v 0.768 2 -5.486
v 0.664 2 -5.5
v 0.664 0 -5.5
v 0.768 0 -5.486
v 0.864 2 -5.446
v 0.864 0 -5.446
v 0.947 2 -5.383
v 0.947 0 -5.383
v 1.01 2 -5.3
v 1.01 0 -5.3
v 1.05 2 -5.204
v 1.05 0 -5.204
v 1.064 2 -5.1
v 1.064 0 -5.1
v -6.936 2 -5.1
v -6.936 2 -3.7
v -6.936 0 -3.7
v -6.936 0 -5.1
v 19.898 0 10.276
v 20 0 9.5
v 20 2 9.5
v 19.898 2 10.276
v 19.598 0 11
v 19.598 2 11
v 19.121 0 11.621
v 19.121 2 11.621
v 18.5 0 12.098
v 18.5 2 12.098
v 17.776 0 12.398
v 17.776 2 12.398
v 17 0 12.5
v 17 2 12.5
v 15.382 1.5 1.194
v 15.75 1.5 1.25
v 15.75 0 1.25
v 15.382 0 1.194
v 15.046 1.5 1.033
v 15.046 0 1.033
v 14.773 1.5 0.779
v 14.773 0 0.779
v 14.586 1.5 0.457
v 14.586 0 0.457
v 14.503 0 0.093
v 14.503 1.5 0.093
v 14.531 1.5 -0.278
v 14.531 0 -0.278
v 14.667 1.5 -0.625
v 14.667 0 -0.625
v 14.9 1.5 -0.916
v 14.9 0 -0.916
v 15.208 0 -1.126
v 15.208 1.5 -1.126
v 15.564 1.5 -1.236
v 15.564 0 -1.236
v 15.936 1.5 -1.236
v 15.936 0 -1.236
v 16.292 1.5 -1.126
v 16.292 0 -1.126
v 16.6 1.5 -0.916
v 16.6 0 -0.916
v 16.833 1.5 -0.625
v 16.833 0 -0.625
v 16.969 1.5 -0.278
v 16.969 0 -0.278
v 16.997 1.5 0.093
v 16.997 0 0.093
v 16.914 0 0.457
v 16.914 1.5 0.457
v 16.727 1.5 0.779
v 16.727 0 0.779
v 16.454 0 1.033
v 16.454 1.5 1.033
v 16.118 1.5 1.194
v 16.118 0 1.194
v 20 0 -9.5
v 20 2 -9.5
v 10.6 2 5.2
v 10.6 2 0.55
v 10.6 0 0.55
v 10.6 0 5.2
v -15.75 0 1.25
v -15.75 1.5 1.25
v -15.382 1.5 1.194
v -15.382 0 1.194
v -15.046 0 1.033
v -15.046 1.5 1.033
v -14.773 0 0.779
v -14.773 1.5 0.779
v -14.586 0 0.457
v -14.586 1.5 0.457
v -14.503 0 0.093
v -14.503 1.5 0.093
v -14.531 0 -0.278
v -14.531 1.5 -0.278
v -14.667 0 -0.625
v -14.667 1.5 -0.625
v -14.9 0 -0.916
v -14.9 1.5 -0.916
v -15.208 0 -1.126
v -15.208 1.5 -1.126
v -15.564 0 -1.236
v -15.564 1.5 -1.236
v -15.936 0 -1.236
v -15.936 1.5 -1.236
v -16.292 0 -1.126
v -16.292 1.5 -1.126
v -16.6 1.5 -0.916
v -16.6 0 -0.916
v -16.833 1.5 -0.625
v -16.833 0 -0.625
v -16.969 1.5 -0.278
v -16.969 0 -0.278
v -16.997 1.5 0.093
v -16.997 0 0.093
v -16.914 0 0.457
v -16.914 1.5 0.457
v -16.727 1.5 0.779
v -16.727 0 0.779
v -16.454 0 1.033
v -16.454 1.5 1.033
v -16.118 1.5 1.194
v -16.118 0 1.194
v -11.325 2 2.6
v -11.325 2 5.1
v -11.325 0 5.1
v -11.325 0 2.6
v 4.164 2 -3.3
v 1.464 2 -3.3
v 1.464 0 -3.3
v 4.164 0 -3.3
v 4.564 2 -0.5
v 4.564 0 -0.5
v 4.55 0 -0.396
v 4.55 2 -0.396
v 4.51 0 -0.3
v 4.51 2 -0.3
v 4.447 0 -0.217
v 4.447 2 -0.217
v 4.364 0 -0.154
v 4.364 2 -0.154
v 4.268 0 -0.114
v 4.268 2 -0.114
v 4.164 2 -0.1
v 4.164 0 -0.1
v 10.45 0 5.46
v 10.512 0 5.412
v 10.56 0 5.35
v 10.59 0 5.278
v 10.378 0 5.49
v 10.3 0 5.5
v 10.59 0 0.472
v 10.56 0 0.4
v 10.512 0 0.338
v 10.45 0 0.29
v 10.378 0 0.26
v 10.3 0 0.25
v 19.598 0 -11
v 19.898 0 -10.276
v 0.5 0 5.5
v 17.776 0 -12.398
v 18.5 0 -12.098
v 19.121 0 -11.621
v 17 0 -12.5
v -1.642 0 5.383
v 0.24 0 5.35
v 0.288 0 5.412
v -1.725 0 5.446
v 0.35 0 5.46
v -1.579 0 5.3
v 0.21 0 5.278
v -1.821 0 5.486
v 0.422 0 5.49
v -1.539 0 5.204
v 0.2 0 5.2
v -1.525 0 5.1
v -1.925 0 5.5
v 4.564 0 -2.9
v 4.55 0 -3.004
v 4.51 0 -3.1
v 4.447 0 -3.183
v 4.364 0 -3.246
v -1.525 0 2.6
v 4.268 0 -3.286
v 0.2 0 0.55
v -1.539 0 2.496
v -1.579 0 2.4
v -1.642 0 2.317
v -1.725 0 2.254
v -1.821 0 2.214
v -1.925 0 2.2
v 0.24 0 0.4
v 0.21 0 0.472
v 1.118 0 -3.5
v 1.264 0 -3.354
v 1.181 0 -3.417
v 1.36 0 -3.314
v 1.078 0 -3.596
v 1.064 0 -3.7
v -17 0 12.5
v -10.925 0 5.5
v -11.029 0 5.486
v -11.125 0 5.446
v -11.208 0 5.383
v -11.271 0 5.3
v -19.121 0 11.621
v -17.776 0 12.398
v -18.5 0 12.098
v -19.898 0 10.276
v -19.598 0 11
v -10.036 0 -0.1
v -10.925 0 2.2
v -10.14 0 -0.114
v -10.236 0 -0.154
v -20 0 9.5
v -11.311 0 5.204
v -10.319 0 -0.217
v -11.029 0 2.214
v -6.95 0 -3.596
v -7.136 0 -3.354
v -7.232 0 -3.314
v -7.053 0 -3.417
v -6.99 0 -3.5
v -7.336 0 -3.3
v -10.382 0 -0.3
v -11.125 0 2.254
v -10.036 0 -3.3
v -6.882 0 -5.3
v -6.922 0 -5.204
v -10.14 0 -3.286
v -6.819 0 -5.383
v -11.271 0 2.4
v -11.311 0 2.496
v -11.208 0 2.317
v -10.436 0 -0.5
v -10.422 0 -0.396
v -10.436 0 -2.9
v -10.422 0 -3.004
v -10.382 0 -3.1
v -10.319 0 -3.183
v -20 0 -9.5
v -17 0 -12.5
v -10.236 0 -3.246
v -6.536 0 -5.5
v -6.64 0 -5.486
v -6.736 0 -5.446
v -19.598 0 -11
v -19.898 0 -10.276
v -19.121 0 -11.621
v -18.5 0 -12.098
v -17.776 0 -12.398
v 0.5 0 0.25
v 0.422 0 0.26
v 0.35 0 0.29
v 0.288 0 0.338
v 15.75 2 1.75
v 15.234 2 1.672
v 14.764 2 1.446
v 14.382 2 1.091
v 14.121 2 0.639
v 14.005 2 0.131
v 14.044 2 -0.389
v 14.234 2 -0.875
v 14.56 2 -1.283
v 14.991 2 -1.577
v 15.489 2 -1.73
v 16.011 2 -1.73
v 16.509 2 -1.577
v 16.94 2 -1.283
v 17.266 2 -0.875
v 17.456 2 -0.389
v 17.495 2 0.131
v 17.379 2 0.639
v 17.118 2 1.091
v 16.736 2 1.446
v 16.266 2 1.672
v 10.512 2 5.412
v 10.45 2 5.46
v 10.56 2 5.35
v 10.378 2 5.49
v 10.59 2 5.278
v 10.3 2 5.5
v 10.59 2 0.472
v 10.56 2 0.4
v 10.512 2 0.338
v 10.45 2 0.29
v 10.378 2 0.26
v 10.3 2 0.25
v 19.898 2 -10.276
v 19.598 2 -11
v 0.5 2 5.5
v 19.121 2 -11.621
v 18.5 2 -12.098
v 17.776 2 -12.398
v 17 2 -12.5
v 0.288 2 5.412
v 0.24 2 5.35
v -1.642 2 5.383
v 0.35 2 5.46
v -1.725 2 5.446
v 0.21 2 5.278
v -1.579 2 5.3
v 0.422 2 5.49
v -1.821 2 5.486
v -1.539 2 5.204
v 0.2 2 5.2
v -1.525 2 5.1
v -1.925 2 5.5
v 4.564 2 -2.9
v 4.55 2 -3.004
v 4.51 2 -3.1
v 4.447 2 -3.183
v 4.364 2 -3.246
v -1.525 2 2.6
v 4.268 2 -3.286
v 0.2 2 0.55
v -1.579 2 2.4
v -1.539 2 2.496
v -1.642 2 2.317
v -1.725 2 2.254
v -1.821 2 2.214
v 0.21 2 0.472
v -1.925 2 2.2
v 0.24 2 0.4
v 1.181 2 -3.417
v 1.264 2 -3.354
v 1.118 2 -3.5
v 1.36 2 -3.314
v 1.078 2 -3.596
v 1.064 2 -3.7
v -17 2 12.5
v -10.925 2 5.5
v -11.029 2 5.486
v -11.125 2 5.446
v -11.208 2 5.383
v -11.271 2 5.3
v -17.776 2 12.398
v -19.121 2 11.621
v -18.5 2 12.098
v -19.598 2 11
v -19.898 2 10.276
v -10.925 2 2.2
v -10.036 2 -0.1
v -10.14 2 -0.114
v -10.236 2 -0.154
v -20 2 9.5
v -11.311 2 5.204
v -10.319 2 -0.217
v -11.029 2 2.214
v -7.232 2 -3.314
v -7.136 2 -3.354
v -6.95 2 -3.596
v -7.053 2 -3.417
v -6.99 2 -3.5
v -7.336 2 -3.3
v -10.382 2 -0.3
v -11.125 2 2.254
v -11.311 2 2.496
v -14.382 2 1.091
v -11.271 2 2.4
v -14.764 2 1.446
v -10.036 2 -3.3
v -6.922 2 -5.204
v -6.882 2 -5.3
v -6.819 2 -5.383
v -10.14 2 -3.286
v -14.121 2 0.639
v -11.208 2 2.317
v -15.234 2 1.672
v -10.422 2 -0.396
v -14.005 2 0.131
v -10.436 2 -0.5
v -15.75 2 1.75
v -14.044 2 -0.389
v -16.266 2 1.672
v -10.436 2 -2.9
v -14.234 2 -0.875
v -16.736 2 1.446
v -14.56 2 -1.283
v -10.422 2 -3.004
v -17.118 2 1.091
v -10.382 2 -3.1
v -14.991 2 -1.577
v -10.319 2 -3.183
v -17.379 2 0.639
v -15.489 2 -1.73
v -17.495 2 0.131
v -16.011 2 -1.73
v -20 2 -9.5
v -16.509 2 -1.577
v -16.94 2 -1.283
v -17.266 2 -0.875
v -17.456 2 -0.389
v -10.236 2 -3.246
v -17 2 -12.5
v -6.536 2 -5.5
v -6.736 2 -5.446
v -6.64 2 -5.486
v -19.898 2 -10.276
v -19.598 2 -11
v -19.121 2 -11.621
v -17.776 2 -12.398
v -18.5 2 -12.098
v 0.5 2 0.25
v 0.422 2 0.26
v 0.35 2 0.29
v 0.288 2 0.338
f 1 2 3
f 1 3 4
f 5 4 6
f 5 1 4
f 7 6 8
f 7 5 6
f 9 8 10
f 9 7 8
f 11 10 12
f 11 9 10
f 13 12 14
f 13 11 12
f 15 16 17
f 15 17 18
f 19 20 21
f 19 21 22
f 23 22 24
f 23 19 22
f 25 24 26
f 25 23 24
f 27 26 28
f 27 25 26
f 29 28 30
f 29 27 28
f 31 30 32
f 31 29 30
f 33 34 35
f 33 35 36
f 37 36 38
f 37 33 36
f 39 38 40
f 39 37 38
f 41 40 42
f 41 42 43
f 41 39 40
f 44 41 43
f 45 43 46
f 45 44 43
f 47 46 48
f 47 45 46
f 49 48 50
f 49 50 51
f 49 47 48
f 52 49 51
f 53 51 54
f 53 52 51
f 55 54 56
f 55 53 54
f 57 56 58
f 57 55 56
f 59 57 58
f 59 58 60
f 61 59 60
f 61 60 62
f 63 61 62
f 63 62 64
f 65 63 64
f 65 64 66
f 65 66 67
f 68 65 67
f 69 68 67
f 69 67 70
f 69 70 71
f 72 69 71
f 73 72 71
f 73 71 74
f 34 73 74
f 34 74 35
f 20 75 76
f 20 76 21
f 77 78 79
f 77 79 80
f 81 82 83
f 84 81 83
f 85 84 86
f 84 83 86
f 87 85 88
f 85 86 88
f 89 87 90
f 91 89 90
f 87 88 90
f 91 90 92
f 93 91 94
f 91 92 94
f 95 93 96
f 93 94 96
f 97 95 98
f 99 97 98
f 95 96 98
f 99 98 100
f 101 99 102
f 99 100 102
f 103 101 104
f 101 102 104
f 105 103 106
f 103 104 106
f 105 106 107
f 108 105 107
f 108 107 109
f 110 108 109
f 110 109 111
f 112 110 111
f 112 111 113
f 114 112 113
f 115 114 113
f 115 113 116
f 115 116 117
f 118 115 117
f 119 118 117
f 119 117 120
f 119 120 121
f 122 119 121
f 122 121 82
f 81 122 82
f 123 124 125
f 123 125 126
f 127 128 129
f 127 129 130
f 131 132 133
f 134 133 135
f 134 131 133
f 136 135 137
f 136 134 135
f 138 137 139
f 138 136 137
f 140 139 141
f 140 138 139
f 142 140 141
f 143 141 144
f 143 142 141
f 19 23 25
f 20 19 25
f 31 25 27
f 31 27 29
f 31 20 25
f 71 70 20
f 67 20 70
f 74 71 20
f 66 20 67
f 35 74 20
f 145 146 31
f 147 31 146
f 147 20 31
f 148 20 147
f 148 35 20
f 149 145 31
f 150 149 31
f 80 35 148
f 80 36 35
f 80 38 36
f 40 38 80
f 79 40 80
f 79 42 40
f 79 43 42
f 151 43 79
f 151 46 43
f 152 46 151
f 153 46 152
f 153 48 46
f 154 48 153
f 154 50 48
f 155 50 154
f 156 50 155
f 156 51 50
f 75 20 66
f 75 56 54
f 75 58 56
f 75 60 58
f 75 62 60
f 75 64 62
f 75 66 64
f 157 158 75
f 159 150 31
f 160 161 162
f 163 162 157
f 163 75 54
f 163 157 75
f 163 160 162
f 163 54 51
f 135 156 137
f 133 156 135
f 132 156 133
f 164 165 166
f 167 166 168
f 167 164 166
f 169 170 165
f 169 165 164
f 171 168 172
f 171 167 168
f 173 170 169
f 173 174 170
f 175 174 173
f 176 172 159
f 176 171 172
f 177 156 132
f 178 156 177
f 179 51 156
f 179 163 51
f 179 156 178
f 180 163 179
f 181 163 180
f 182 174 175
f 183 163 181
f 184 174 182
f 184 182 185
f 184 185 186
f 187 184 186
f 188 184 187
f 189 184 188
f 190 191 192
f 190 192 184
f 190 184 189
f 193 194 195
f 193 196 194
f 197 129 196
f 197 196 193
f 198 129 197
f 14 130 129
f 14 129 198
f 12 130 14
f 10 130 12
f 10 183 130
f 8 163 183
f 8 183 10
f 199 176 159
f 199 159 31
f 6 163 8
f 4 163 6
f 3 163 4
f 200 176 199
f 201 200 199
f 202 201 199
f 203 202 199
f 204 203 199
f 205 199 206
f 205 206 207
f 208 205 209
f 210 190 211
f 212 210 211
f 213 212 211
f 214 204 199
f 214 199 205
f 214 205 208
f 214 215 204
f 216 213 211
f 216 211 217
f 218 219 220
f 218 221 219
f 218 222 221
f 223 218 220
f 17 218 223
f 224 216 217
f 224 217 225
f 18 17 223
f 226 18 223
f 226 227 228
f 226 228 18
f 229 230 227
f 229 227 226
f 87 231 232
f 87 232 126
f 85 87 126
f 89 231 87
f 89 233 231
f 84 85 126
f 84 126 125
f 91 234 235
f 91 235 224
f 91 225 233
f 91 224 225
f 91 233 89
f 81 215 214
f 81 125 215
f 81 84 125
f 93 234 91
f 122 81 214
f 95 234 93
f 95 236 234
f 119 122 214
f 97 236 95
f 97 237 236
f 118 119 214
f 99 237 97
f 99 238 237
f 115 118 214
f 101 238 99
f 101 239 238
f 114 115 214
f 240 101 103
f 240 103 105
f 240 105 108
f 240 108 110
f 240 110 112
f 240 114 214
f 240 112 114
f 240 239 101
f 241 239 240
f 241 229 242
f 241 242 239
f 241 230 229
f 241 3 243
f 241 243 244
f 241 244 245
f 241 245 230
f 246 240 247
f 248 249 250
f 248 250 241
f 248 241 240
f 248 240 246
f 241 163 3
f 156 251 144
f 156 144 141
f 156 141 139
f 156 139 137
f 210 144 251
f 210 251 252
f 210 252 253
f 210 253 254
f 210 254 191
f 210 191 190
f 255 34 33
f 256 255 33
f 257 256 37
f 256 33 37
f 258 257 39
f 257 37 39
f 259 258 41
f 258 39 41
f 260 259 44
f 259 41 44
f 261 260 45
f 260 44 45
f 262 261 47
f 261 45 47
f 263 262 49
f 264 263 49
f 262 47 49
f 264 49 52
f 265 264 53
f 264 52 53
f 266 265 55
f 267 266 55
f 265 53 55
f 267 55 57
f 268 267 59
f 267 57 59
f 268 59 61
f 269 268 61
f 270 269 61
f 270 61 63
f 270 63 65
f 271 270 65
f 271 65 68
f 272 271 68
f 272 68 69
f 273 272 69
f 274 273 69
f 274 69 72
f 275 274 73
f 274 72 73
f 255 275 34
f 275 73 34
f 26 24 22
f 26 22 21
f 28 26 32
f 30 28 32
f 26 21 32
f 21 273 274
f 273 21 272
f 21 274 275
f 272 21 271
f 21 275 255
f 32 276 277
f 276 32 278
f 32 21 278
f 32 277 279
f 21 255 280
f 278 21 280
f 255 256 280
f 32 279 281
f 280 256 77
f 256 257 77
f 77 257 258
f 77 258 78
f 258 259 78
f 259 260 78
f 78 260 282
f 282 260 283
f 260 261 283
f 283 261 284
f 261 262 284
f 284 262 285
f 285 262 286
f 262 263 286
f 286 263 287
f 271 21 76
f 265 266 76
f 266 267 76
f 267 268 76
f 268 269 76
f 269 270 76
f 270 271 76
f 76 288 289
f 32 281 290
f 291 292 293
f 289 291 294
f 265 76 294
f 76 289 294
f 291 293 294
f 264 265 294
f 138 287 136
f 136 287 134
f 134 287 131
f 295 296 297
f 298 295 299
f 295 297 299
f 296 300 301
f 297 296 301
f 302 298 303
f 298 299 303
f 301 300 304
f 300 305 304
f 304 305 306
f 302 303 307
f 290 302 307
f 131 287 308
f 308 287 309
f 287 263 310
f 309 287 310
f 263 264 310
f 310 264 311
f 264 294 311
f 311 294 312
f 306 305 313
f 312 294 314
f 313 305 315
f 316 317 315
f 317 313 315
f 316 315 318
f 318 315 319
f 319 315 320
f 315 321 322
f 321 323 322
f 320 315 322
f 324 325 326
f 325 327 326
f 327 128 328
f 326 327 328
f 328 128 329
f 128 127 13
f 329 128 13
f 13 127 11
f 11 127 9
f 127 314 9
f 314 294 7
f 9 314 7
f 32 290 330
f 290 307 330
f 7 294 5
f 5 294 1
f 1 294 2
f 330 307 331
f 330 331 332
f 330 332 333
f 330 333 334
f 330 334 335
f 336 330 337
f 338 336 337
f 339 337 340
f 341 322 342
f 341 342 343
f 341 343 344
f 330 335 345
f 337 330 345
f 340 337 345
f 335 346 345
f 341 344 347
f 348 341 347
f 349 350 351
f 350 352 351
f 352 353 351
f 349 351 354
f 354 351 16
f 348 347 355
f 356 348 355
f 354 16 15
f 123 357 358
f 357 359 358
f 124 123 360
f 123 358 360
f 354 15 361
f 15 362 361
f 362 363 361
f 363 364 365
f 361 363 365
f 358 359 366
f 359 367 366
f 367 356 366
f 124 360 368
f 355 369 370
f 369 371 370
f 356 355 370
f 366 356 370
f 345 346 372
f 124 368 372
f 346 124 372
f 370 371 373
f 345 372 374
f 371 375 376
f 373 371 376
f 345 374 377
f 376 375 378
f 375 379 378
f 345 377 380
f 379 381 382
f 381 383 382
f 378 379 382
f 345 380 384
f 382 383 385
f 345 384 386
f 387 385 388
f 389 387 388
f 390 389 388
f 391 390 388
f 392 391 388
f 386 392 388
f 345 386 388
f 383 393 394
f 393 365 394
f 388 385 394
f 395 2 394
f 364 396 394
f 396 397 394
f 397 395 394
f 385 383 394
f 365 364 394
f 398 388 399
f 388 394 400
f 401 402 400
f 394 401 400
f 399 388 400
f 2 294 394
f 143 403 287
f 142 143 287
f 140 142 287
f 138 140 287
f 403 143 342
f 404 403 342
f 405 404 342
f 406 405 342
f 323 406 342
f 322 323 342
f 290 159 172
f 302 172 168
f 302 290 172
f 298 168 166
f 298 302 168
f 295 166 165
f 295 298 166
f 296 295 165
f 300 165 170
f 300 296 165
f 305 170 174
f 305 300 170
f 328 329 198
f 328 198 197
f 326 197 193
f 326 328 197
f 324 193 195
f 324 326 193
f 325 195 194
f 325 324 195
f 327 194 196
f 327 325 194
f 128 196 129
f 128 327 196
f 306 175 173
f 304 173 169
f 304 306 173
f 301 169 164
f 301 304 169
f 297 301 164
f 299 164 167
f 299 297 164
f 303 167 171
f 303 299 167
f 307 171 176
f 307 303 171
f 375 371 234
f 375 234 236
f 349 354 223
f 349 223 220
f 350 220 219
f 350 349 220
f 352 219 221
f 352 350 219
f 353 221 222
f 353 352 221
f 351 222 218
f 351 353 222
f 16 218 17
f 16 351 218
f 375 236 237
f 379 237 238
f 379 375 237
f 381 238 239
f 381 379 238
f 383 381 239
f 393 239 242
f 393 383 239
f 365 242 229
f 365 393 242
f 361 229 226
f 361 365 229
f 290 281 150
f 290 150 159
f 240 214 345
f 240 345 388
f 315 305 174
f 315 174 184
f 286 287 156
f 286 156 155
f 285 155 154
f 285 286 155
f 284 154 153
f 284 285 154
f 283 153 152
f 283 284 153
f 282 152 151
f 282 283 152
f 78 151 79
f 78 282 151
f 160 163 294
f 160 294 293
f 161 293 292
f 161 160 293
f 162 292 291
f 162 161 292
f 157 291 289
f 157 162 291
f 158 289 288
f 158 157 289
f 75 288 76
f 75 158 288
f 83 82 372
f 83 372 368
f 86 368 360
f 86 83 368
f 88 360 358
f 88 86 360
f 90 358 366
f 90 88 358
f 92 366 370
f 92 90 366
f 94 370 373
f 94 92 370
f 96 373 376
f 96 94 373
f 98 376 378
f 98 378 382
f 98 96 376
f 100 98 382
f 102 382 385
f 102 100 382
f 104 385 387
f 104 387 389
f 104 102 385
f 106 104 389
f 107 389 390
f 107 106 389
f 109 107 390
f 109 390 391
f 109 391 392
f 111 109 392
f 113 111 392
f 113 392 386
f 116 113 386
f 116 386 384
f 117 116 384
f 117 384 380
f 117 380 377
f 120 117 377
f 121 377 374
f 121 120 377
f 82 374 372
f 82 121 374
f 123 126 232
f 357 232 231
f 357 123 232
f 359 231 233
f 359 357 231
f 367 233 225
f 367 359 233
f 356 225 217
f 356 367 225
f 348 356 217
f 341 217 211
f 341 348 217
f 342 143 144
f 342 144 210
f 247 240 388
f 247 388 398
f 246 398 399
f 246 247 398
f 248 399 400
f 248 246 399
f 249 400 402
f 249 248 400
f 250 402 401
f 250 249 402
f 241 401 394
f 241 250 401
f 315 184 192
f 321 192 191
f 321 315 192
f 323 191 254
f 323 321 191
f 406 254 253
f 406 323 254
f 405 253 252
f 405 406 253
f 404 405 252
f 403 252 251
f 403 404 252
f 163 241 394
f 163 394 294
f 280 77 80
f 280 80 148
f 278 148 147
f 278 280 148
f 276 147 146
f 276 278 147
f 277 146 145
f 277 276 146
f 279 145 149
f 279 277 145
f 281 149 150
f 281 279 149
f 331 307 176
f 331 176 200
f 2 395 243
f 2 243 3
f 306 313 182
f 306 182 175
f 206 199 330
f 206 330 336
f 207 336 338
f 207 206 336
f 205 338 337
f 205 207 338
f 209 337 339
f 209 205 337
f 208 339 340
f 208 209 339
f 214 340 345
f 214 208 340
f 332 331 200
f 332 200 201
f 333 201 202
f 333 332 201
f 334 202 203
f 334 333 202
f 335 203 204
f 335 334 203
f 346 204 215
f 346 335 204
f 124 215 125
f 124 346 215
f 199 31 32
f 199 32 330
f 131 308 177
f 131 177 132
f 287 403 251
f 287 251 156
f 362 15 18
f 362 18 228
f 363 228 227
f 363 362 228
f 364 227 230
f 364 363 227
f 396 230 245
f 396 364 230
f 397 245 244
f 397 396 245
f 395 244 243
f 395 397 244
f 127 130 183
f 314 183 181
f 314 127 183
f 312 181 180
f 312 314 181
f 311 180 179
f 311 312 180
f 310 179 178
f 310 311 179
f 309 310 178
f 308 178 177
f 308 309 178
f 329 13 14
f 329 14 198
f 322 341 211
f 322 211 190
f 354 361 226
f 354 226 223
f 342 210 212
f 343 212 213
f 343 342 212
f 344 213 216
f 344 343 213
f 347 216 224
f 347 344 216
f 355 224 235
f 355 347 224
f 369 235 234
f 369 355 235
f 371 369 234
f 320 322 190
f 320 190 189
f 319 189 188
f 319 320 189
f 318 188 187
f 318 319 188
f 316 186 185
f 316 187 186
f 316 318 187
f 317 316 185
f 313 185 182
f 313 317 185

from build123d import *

# Parameters (mm, degrees)
EXTRUDE_1_DEPTH            = 2
CUT_EXTRUDE_1_REACH        = 25.67
SKETCH_2_R                 = 1.25
CHAMFER_1_SIZE             = 0.5
CHAMFER_1_OF_MIRROR_3_SIZE = 0.5
CUT_EXTRUDE_5_REACH        = 25.67


with BuildPart() as part:
    # 草图1 → 凸台-拉伸1 (new body)
    with BuildSketch(Plane(origin=(0, 0, 0), x_dir=(1, 0, 0), z_dir=(0, 1, 0))):
        with BuildLine():
            Line((-17, 12.5), (17, 12.5))
            ThreePointArc((17, 12.5), (19.121320344, 11.621320344), (20, 9.5))
            Line((20, 9.5), (20, -9.5))
            ThreePointArc((20, -9.5), (19.121320344, -11.621320344), (17, -12.5))
            Line((17, -12.5), (-17, -12.5))
            ThreePointArc((-17, -12.5), (-19.121320344, -11.621320344), (-20, -9.5))
            Line((-20, -9.5), (-20, 9.5))
            ThreePointArc((-20, 9.5), (-19.121320344, 11.621320344), (-17, 12.5))
        make_face()
    extrude(amount=EXTRUDE_1_DEPTH)

    # 草图2 → 切除-拉伸1 (cut, up to next)
    with BuildSketch(Plane(origin=(0, 2, 0), x_dir=(1, 0, 0), z_dir=(0, 1, 0)), mode=Mode.PRIVATE) as cut_extrude_1_sk1:
        with Locations(Location((-15.75, 0, 0), (0, 0, 270))):
            Circle(SKETCH_2_R)
    cut_extrude_1_tool1 = extrude(cut_extrude_1_sk1.sketch, amount=-CUT_EXTRUDE_1_REACH, mode=Mode.PRIVATE) & part.part
    cut_extrude_1 = cut_extrude_1_tool1.solids().sort_by_distance((-15.75, 2, 0))[0]
    add(cut_extrude_1, mode=Mode.SUBTRACT)

    # 倒角1
    chamfer_1_edges = [part.edges().sort_by_distance(p)[0] for p in [
        (-15.75, 2, -1.25),
    ]]
    chamfer(chamfer_1_edges, length=CHAMFER_1_SIZE)

    # 镜向3: 切除-拉伸1 across plane
    add(cut_extrude_1.mirror(Plane(origin=(0, 0, 0), x_dir=(0, 0, 1), z_dir=(1, 0, 0))), mode=Mode.SUBTRACT)

    # 倒角1 of 镜向3
    chamfer_1_of_mirror_3_edges = [part.edges().sort_by_distance(p)[0] for p in [
        (15.75, 2, -1.25),
    ]]
    chamfer(chamfer_1_of_mirror_3_edges, length=CHAMFER_1_OF_MIRROR_3_SIZE)

    # 草图6 → 切除-拉伸5 (cut, up to next)
    with BuildSketch(Plane(origin=(0, 2, 0), x_dir=(1, 0, 0), z_dir=(0, 1, 0)), mode=Mode.PRIVATE) as cut_extrude_5_sk1:
        with BuildLine():
            Line((-10.036, 3.3), (-7.336, 3.3))
            ThreePointArc((-7.336, 3.3), (-7.053157288, 3.417157288), (-6.936, 3.7))
            Line((-6.936, 3.7), (-6.936, 5.1))
            ThreePointArc((-6.936, 5.1), (-6.818842712, 5.382842712), (-6.536, 5.5))
            Line((-6.536, 5.5), (0.664, 5.5))
            ThreePointArc((0.664, 5.5), (0.946842712, 5.382842712), (1.064, 5.1))
            Line((1.064, 5.1), (1.064, 3.7))
            ThreePointArc((1.064, 3.7), (1.181157288, 3.417157288), (1.464, 3.3))
            Line((1.464, 3.3), (4.164, 3.3))
            ThreePointArc((4.164, 3.3), (4.446842712, 3.182842712), (4.564, 2.9))
            Line((4.564, 2.9), (4.564, 0.5))
            ThreePointArc((4.564, 0.5), (4.446842712, 0.217157288), (4.164, 0.1))
            Line((4.164, 0.1), (-10.036, 0.1))
            ThreePointArc((-10.036, 0.1), (-10.318842712, 0.217157288), (-10.436, 0.5))
            Line((-10.436, 0.5), (-10.436, 2.9))
            ThreePointArc((-10.436, 2.9), (-10.318842712, 3.182842712), (-10.036, 3.3))
        make_face()
    cut_extrude_5_tool1 = extrude(cut_extrude_5_sk1.sketch, amount=-CUT_EXTRUDE_5_REACH, mode=Mode.PRIVATE) & part.part
    # 草图6 → 切除-拉伸5 (cut, up to next)
    with BuildSketch(Plane(origin=(0, 2, 0), x_dir=(1, 0, 0), z_dir=(0, 1, 0)), mode=Mode.PRIVATE) as cut_extrude_5_sk2:
        with BuildLine():
            Line((-10.925, -2.2), (-1.925, -2.2))
            ThreePointArc((-1.925, -2.2), (-1.642157288, -2.317157288), (-1.525, -2.6))
            Line((-1.525, -2.6), (-1.525, -5.1))
            ThreePointArc((-1.525, -5.1), (-1.642157288, -5.382842712), (-1.925, -5.5))
            Line((-1.925, -5.5), (-10.925, -5.5))
            ThreePointArc((-10.925, -5.5), (-11.207842712, -5.382842712), (-11.325, -5.1))
            Line((-11.325, -5.1), (-11.325, -2.6))
            ThreePointArc((-11.325, -2.6), (-11.207842712, -2.317157288), (-10.925, -2.2))
        make_face()
    cut_extrude_5_tool2 = extrude(cut_extrude_5_sk2.sketch, amount=-CUT_EXTRUDE_5_REACH, mode=Mode.PRIVATE) & part.part
    # 草图6 → 切除-拉伸5 (cut, up to next)
    with BuildSketch(Plane(origin=(0, 2, 0), x_dir=(1, 0, 0), z_dir=(0, 1, 0)), mode=Mode.PRIVATE) as cut_extrude_5_sk3:
        with BuildLine():
            Line((0.5, -0.25), (10.3, -0.25))
            ThreePointArc((10.3, -0.25), (10.512132034, -0.337867966), (10.6, -0.55))
            Line((10.6, -0.55), (10.6, -5.2))
            ThreePointArc((10.6, -5.2), (10.512132034, -5.412132034), (10.3, -5.5))
            Line((10.3, -5.5), (0.5, -5.5))
            ThreePointArc((0.5, -5.5), (0.287867966, -5.412132034), (0.2, -5.2))
            Line((0.2, -5.2), (0.2, -0.55))
            ThreePointArc((0.2, -0.55), (0.287867966, -0.337867966), (0.5, -0.25))
        make_face()
    cut_extrude_5_tool3 = extrude(cut_extrude_5_sk3.sketch, amount=-CUT_EXTRUDE_5_REACH, mode=Mode.PRIVATE) & part.part
    add(cut_extrude_5_tool1.solids().sort_by_distance((-2.936, 2, -2.42379))[0], mode=Mode.SUBTRACT)
    add(cut_extrude_5_tool2.solids().sort_by_distance((-6.425, 2, 3.85))[0], mode=Mode.SUBTRACT)
    add(cut_extrude_5_tool3.solids().sort_by_distance((5.4, 2, 2.875))[0], mode=Mode.SUBTRACT)


solid = part.part
